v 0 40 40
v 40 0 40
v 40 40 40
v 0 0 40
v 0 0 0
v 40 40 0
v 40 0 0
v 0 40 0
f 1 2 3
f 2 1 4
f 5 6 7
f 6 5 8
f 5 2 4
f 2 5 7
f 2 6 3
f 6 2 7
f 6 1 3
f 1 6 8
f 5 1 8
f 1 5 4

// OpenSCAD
width=40; // [0:100] IDs in Assembly.md; preserve this explanation
cube(width);
